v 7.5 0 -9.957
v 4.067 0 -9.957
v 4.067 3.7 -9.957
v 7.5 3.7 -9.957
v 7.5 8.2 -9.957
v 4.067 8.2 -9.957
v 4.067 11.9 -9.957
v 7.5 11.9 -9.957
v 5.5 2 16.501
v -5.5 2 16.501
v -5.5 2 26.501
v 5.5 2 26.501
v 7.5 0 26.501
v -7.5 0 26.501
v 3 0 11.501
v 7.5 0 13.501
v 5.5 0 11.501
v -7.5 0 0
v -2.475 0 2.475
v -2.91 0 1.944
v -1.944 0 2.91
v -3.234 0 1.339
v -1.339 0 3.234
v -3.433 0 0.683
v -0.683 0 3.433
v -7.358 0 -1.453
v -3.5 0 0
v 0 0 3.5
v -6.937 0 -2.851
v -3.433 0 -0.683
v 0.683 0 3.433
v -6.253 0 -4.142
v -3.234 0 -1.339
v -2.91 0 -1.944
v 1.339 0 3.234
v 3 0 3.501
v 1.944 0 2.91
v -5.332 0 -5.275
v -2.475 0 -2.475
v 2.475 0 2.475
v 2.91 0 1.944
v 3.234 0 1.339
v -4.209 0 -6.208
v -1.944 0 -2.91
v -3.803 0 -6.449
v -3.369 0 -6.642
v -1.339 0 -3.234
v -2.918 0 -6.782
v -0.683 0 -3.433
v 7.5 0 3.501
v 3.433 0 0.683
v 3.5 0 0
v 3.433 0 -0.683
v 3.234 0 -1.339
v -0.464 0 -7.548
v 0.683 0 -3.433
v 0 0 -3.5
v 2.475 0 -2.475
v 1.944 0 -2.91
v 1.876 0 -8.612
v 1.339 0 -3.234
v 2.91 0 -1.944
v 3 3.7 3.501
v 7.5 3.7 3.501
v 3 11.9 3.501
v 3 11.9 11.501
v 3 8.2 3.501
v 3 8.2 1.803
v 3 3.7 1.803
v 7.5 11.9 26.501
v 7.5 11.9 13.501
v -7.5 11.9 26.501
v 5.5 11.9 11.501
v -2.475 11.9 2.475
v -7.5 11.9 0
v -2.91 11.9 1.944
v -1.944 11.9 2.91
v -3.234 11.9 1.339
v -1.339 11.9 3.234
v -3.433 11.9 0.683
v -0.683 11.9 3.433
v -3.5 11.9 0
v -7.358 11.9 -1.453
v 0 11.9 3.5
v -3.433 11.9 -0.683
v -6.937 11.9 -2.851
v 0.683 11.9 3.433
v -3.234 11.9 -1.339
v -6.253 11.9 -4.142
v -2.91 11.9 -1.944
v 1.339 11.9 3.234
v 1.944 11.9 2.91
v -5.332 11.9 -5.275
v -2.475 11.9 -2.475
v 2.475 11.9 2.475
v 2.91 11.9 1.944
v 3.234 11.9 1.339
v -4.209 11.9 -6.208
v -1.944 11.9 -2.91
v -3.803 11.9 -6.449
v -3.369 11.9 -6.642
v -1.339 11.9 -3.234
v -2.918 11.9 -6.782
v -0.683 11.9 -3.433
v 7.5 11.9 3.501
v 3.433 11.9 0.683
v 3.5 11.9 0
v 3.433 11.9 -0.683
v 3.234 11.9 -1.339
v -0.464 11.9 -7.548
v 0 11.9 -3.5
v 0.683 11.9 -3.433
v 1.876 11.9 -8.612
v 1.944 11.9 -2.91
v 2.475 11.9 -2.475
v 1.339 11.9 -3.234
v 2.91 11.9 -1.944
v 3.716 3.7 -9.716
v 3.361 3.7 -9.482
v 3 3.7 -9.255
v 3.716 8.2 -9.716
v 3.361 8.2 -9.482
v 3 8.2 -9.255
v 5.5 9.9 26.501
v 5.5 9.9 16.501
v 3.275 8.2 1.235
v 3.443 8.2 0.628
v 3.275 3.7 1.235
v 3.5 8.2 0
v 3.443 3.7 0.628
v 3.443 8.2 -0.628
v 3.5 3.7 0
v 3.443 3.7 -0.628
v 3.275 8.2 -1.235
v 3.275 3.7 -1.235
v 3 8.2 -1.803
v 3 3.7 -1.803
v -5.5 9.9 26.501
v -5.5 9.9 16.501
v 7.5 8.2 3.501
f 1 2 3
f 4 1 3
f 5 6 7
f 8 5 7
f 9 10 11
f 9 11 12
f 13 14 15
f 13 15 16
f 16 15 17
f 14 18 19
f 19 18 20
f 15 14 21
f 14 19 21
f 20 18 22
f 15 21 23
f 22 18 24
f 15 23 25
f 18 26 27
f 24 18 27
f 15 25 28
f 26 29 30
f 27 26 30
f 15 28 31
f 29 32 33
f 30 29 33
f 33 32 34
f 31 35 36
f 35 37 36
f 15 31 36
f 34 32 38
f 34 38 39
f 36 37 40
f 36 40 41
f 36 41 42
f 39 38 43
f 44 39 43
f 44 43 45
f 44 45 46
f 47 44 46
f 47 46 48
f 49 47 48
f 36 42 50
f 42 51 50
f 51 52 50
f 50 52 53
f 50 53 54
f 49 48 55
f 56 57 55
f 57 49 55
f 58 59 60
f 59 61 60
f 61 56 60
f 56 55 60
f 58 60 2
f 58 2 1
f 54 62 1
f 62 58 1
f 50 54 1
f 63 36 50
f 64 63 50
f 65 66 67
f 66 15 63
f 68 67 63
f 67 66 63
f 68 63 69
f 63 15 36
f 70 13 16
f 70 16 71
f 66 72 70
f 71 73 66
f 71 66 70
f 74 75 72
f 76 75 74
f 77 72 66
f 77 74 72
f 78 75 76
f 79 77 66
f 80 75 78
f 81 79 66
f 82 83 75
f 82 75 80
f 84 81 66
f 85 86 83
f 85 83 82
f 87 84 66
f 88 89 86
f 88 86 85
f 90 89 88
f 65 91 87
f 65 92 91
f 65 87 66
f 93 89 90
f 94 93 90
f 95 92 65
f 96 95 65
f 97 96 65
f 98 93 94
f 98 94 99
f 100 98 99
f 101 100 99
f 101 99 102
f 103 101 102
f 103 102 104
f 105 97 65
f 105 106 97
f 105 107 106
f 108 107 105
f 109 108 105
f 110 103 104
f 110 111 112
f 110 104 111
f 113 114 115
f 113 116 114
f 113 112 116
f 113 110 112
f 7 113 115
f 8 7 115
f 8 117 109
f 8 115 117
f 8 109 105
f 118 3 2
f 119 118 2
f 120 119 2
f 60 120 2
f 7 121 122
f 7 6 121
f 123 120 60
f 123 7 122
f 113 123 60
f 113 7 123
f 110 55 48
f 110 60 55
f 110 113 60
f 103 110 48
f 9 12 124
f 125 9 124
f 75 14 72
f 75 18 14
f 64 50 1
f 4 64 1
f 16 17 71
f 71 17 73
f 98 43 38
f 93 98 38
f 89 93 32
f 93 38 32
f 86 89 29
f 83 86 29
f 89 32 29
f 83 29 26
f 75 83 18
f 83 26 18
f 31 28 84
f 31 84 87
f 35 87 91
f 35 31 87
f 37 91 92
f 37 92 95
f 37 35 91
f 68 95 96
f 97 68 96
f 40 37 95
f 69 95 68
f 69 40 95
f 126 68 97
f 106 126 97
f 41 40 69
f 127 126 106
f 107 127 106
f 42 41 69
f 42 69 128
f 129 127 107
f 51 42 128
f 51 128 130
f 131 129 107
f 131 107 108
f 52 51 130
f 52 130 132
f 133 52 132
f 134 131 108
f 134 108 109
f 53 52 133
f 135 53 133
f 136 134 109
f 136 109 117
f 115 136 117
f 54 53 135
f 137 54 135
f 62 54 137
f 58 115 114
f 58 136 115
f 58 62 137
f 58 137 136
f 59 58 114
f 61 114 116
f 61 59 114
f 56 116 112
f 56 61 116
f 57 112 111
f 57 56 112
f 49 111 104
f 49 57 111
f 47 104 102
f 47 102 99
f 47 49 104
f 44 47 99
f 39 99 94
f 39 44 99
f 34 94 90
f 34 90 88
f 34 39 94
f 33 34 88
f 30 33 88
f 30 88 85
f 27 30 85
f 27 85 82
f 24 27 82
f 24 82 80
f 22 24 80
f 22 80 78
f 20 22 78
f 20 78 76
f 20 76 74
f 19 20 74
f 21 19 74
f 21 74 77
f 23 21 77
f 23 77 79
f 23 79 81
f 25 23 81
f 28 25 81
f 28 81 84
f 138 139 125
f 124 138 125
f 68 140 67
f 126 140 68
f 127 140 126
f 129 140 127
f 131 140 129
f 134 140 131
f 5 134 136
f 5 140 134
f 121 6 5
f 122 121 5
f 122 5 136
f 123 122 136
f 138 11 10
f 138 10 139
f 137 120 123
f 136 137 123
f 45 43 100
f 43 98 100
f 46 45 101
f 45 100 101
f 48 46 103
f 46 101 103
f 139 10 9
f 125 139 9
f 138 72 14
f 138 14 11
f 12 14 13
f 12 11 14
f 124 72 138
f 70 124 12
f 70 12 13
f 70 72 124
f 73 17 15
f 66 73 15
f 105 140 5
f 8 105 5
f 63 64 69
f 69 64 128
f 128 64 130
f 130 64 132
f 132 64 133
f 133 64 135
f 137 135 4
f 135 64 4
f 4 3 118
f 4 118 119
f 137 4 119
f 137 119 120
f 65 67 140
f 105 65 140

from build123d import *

# Parameters (mm, degrees)
SKETCH3_R               = 3.5
BOSS_EXTRUDE2_DEPTH     = 11.9
CUT_EXTRUDE1_REACH      = 34.374
SKETCH4_W               = 9
SKETCH4_H               = 4.5
SKETCH5_W               = 15
SKETCH5_H               = 11.9
SKETCH5_W_2             = 11
SKETCH5_H_2             = 7.9
BOSS_EXTRUDE3_DEPTH     = 10
CUT_EXTRUDE2_DEPTH      = 33.694142686
CUT_EXTRUDE2_DEPTH_BACK = 33.694142686
SKETCH6_W               = 2.7
SKETCH6_H               = 11.9
CUT_EXTRUDE3_DEPTH      = 31.002615985
CUT_EXTRUDE3_DEPTH_BACK = 31.002615985
FILLET1_R               = 4
CHAMFER1_SIZE           = 2


with BuildPart() as part:
    # Sketch3 → Boss-Extrude2 (new body)
    with BuildSketch(Plane(origin=(0, 0, 0), x_dir=(1, 0, 0), z_dir=(0, 1, 0))):
        with BuildLine():
            Line((7.5, 0), (7.5, 12.657479881))
            Line((7.5, 12.657479881), (4.816081625, 12.657479881))
            ThreePointArc((4.816081625, 12.657479881), (1.359085459, 11.744283435), (-1.195934532, 9.242959169))
            ThreePointArc((-1.195934532, 9.242959169), (-2.208037755, 7.848359435), (-3.45353313, 6.657560283))
            ThreePointArc((-3.45353313, 6.657560283), (-6.40903653, 3.895414068), (-7.5, 0))
            Line((-7.5, 0), (-7.5, -16.500886135))
            Line((-7.5, -16.500886135), (7.5, -16.500886135))
            Line((7.5, -16.500886135), (7.5, -11.500886135))
            Line((7.5, -11.500886135), (3, -11.500886135))
            Line((3, -11.500886135), (3, -3.500886135))
            Line((3, -3.500886135), (7.5, -3.500886135))
            Line((7.5, -3.500886135), (7.5, 0))
        make_face()
        with Locations(Location((0, 0, 0), (0, 0, 270))):
            Circle(SKETCH3_R, mode=Mode.SUBTRACT)
    extrude(amount=BOSS_EXTRUDE2_DEPTH)

    # Cut-Extrude1: up to this face of the body (flat: up to its plane)
    cut_extrude1_end = Plane(part.part.faces().sort_by_distance((5.25, 5.95, 3.500886135))[0])
    # Sketch4 → Cut-Extrude1 (cut, up to the picked face)
    with BuildSketch(Plane(origin=(0, 0, -12.657479881), x_dir=(-1, 0, 0), z_dir=(0, 0, -1)), mode=Mode.PRIVATE) as cut_extrude1_sk1:
        with Locations((-7.5, 5.95)):
            Rectangle(SKETCH4_W, SKETCH4_H)
    cut_extrude1_tool1 = split(extrude(cut_extrude1_sk1.sketch, amount=-CUT_EXTRUDE1_REACH, mode=Mode.PRIVATE), bisect_by=cut_extrude1_end, keep=Keep.BOTH, mode=Mode.PRIVATE)
    add(cut_extrude1_tool1.solids().sort_by(Axis((7.5, 5.95, -12.65748), (0, 0, 1)))[0], mode=Mode.SUBTRACT)

    # Sketch5 → Boss-Extrude3 (add)
    with BuildSketch(Plane.XY.offset(16.500886135)):
        with Locations((0, 5.95)):
            Rectangle(SKETCH5_W, SKETCH5_H)
        with Locations((0, 5.95)):
            Rectangle(SKETCH5_W_2, SKETCH5_H_2, mode=Mode.SUBTRACT)
    extrude(amount=BOSS_EXTRUDE3_DEPTH)

    # Sketch6 → Cut-Extrude2 (cut, two sides: drawn at the far end of the back side and taken through both)
    with BuildSketch(Plane(origin=(7.5, 0, 0), x_dir=(0, 0, -1), z_dir=(1, 0, 0)).offset(-CUT_EXTRUDE2_DEPTH_BACK)):
        with Locations((11.307479881, 5.95)):
            Rectangle(SKETCH6_W, SKETCH6_H)
    extrude(amount=CUT_EXTRUDE2_DEPTH + CUT_EXTRUDE2_DEPTH_BACK, mode=Mode.SUBTRACT)

    # Sketch7 → Cut-Extrude3 (cut, two sides: drawn at the far end of the back side and taken through both)
    with BuildSketch(Plane.XZ.offset(-CUT_EXTRUDE3_DEPTH_BACK)):
        with BuildLine():
            Line((-3.45353313, -6.657560283), (-1.779949015, -9.678496559))
            Line((-1.779949015, -9.678496559), (0.471666332, -11.274565758))
            Line((0.471666332, -11.274565758), (4.067189111, -10.062167039))
            Line((4.067189111, -10.062167039), (4.067189111, -9.957479881))
            ThreePointArc((4.067189111, -9.957479881), (0.471666332, -7.931843239), (-3.45353313, -6.657560283))
        make_face()
    extrude(amount=CUT_EXTRUDE3_DEPTH + CUT_EXTRUDE3_DEPTH_BACK, mode=Mode.SUBTRACT)

    # Fillet1
    fillet1_edges = [part.edges().sort_by_distance(p)[0] for p in [
        (-3.45353313, 5.95, -6.657560283),
    ]]
    fillet(fillet1_edges, radius=FILLET1_R)

    # Chamfer1
    chamfer1_edges = [part.edges().sort_by_distance(p)[0] for p in [
        (7.5, 5.95, 11.500886135),
    ]]
    chamfer(chamfer1_edges, length=CHAMFER1_SIZE)


solid = part.part
